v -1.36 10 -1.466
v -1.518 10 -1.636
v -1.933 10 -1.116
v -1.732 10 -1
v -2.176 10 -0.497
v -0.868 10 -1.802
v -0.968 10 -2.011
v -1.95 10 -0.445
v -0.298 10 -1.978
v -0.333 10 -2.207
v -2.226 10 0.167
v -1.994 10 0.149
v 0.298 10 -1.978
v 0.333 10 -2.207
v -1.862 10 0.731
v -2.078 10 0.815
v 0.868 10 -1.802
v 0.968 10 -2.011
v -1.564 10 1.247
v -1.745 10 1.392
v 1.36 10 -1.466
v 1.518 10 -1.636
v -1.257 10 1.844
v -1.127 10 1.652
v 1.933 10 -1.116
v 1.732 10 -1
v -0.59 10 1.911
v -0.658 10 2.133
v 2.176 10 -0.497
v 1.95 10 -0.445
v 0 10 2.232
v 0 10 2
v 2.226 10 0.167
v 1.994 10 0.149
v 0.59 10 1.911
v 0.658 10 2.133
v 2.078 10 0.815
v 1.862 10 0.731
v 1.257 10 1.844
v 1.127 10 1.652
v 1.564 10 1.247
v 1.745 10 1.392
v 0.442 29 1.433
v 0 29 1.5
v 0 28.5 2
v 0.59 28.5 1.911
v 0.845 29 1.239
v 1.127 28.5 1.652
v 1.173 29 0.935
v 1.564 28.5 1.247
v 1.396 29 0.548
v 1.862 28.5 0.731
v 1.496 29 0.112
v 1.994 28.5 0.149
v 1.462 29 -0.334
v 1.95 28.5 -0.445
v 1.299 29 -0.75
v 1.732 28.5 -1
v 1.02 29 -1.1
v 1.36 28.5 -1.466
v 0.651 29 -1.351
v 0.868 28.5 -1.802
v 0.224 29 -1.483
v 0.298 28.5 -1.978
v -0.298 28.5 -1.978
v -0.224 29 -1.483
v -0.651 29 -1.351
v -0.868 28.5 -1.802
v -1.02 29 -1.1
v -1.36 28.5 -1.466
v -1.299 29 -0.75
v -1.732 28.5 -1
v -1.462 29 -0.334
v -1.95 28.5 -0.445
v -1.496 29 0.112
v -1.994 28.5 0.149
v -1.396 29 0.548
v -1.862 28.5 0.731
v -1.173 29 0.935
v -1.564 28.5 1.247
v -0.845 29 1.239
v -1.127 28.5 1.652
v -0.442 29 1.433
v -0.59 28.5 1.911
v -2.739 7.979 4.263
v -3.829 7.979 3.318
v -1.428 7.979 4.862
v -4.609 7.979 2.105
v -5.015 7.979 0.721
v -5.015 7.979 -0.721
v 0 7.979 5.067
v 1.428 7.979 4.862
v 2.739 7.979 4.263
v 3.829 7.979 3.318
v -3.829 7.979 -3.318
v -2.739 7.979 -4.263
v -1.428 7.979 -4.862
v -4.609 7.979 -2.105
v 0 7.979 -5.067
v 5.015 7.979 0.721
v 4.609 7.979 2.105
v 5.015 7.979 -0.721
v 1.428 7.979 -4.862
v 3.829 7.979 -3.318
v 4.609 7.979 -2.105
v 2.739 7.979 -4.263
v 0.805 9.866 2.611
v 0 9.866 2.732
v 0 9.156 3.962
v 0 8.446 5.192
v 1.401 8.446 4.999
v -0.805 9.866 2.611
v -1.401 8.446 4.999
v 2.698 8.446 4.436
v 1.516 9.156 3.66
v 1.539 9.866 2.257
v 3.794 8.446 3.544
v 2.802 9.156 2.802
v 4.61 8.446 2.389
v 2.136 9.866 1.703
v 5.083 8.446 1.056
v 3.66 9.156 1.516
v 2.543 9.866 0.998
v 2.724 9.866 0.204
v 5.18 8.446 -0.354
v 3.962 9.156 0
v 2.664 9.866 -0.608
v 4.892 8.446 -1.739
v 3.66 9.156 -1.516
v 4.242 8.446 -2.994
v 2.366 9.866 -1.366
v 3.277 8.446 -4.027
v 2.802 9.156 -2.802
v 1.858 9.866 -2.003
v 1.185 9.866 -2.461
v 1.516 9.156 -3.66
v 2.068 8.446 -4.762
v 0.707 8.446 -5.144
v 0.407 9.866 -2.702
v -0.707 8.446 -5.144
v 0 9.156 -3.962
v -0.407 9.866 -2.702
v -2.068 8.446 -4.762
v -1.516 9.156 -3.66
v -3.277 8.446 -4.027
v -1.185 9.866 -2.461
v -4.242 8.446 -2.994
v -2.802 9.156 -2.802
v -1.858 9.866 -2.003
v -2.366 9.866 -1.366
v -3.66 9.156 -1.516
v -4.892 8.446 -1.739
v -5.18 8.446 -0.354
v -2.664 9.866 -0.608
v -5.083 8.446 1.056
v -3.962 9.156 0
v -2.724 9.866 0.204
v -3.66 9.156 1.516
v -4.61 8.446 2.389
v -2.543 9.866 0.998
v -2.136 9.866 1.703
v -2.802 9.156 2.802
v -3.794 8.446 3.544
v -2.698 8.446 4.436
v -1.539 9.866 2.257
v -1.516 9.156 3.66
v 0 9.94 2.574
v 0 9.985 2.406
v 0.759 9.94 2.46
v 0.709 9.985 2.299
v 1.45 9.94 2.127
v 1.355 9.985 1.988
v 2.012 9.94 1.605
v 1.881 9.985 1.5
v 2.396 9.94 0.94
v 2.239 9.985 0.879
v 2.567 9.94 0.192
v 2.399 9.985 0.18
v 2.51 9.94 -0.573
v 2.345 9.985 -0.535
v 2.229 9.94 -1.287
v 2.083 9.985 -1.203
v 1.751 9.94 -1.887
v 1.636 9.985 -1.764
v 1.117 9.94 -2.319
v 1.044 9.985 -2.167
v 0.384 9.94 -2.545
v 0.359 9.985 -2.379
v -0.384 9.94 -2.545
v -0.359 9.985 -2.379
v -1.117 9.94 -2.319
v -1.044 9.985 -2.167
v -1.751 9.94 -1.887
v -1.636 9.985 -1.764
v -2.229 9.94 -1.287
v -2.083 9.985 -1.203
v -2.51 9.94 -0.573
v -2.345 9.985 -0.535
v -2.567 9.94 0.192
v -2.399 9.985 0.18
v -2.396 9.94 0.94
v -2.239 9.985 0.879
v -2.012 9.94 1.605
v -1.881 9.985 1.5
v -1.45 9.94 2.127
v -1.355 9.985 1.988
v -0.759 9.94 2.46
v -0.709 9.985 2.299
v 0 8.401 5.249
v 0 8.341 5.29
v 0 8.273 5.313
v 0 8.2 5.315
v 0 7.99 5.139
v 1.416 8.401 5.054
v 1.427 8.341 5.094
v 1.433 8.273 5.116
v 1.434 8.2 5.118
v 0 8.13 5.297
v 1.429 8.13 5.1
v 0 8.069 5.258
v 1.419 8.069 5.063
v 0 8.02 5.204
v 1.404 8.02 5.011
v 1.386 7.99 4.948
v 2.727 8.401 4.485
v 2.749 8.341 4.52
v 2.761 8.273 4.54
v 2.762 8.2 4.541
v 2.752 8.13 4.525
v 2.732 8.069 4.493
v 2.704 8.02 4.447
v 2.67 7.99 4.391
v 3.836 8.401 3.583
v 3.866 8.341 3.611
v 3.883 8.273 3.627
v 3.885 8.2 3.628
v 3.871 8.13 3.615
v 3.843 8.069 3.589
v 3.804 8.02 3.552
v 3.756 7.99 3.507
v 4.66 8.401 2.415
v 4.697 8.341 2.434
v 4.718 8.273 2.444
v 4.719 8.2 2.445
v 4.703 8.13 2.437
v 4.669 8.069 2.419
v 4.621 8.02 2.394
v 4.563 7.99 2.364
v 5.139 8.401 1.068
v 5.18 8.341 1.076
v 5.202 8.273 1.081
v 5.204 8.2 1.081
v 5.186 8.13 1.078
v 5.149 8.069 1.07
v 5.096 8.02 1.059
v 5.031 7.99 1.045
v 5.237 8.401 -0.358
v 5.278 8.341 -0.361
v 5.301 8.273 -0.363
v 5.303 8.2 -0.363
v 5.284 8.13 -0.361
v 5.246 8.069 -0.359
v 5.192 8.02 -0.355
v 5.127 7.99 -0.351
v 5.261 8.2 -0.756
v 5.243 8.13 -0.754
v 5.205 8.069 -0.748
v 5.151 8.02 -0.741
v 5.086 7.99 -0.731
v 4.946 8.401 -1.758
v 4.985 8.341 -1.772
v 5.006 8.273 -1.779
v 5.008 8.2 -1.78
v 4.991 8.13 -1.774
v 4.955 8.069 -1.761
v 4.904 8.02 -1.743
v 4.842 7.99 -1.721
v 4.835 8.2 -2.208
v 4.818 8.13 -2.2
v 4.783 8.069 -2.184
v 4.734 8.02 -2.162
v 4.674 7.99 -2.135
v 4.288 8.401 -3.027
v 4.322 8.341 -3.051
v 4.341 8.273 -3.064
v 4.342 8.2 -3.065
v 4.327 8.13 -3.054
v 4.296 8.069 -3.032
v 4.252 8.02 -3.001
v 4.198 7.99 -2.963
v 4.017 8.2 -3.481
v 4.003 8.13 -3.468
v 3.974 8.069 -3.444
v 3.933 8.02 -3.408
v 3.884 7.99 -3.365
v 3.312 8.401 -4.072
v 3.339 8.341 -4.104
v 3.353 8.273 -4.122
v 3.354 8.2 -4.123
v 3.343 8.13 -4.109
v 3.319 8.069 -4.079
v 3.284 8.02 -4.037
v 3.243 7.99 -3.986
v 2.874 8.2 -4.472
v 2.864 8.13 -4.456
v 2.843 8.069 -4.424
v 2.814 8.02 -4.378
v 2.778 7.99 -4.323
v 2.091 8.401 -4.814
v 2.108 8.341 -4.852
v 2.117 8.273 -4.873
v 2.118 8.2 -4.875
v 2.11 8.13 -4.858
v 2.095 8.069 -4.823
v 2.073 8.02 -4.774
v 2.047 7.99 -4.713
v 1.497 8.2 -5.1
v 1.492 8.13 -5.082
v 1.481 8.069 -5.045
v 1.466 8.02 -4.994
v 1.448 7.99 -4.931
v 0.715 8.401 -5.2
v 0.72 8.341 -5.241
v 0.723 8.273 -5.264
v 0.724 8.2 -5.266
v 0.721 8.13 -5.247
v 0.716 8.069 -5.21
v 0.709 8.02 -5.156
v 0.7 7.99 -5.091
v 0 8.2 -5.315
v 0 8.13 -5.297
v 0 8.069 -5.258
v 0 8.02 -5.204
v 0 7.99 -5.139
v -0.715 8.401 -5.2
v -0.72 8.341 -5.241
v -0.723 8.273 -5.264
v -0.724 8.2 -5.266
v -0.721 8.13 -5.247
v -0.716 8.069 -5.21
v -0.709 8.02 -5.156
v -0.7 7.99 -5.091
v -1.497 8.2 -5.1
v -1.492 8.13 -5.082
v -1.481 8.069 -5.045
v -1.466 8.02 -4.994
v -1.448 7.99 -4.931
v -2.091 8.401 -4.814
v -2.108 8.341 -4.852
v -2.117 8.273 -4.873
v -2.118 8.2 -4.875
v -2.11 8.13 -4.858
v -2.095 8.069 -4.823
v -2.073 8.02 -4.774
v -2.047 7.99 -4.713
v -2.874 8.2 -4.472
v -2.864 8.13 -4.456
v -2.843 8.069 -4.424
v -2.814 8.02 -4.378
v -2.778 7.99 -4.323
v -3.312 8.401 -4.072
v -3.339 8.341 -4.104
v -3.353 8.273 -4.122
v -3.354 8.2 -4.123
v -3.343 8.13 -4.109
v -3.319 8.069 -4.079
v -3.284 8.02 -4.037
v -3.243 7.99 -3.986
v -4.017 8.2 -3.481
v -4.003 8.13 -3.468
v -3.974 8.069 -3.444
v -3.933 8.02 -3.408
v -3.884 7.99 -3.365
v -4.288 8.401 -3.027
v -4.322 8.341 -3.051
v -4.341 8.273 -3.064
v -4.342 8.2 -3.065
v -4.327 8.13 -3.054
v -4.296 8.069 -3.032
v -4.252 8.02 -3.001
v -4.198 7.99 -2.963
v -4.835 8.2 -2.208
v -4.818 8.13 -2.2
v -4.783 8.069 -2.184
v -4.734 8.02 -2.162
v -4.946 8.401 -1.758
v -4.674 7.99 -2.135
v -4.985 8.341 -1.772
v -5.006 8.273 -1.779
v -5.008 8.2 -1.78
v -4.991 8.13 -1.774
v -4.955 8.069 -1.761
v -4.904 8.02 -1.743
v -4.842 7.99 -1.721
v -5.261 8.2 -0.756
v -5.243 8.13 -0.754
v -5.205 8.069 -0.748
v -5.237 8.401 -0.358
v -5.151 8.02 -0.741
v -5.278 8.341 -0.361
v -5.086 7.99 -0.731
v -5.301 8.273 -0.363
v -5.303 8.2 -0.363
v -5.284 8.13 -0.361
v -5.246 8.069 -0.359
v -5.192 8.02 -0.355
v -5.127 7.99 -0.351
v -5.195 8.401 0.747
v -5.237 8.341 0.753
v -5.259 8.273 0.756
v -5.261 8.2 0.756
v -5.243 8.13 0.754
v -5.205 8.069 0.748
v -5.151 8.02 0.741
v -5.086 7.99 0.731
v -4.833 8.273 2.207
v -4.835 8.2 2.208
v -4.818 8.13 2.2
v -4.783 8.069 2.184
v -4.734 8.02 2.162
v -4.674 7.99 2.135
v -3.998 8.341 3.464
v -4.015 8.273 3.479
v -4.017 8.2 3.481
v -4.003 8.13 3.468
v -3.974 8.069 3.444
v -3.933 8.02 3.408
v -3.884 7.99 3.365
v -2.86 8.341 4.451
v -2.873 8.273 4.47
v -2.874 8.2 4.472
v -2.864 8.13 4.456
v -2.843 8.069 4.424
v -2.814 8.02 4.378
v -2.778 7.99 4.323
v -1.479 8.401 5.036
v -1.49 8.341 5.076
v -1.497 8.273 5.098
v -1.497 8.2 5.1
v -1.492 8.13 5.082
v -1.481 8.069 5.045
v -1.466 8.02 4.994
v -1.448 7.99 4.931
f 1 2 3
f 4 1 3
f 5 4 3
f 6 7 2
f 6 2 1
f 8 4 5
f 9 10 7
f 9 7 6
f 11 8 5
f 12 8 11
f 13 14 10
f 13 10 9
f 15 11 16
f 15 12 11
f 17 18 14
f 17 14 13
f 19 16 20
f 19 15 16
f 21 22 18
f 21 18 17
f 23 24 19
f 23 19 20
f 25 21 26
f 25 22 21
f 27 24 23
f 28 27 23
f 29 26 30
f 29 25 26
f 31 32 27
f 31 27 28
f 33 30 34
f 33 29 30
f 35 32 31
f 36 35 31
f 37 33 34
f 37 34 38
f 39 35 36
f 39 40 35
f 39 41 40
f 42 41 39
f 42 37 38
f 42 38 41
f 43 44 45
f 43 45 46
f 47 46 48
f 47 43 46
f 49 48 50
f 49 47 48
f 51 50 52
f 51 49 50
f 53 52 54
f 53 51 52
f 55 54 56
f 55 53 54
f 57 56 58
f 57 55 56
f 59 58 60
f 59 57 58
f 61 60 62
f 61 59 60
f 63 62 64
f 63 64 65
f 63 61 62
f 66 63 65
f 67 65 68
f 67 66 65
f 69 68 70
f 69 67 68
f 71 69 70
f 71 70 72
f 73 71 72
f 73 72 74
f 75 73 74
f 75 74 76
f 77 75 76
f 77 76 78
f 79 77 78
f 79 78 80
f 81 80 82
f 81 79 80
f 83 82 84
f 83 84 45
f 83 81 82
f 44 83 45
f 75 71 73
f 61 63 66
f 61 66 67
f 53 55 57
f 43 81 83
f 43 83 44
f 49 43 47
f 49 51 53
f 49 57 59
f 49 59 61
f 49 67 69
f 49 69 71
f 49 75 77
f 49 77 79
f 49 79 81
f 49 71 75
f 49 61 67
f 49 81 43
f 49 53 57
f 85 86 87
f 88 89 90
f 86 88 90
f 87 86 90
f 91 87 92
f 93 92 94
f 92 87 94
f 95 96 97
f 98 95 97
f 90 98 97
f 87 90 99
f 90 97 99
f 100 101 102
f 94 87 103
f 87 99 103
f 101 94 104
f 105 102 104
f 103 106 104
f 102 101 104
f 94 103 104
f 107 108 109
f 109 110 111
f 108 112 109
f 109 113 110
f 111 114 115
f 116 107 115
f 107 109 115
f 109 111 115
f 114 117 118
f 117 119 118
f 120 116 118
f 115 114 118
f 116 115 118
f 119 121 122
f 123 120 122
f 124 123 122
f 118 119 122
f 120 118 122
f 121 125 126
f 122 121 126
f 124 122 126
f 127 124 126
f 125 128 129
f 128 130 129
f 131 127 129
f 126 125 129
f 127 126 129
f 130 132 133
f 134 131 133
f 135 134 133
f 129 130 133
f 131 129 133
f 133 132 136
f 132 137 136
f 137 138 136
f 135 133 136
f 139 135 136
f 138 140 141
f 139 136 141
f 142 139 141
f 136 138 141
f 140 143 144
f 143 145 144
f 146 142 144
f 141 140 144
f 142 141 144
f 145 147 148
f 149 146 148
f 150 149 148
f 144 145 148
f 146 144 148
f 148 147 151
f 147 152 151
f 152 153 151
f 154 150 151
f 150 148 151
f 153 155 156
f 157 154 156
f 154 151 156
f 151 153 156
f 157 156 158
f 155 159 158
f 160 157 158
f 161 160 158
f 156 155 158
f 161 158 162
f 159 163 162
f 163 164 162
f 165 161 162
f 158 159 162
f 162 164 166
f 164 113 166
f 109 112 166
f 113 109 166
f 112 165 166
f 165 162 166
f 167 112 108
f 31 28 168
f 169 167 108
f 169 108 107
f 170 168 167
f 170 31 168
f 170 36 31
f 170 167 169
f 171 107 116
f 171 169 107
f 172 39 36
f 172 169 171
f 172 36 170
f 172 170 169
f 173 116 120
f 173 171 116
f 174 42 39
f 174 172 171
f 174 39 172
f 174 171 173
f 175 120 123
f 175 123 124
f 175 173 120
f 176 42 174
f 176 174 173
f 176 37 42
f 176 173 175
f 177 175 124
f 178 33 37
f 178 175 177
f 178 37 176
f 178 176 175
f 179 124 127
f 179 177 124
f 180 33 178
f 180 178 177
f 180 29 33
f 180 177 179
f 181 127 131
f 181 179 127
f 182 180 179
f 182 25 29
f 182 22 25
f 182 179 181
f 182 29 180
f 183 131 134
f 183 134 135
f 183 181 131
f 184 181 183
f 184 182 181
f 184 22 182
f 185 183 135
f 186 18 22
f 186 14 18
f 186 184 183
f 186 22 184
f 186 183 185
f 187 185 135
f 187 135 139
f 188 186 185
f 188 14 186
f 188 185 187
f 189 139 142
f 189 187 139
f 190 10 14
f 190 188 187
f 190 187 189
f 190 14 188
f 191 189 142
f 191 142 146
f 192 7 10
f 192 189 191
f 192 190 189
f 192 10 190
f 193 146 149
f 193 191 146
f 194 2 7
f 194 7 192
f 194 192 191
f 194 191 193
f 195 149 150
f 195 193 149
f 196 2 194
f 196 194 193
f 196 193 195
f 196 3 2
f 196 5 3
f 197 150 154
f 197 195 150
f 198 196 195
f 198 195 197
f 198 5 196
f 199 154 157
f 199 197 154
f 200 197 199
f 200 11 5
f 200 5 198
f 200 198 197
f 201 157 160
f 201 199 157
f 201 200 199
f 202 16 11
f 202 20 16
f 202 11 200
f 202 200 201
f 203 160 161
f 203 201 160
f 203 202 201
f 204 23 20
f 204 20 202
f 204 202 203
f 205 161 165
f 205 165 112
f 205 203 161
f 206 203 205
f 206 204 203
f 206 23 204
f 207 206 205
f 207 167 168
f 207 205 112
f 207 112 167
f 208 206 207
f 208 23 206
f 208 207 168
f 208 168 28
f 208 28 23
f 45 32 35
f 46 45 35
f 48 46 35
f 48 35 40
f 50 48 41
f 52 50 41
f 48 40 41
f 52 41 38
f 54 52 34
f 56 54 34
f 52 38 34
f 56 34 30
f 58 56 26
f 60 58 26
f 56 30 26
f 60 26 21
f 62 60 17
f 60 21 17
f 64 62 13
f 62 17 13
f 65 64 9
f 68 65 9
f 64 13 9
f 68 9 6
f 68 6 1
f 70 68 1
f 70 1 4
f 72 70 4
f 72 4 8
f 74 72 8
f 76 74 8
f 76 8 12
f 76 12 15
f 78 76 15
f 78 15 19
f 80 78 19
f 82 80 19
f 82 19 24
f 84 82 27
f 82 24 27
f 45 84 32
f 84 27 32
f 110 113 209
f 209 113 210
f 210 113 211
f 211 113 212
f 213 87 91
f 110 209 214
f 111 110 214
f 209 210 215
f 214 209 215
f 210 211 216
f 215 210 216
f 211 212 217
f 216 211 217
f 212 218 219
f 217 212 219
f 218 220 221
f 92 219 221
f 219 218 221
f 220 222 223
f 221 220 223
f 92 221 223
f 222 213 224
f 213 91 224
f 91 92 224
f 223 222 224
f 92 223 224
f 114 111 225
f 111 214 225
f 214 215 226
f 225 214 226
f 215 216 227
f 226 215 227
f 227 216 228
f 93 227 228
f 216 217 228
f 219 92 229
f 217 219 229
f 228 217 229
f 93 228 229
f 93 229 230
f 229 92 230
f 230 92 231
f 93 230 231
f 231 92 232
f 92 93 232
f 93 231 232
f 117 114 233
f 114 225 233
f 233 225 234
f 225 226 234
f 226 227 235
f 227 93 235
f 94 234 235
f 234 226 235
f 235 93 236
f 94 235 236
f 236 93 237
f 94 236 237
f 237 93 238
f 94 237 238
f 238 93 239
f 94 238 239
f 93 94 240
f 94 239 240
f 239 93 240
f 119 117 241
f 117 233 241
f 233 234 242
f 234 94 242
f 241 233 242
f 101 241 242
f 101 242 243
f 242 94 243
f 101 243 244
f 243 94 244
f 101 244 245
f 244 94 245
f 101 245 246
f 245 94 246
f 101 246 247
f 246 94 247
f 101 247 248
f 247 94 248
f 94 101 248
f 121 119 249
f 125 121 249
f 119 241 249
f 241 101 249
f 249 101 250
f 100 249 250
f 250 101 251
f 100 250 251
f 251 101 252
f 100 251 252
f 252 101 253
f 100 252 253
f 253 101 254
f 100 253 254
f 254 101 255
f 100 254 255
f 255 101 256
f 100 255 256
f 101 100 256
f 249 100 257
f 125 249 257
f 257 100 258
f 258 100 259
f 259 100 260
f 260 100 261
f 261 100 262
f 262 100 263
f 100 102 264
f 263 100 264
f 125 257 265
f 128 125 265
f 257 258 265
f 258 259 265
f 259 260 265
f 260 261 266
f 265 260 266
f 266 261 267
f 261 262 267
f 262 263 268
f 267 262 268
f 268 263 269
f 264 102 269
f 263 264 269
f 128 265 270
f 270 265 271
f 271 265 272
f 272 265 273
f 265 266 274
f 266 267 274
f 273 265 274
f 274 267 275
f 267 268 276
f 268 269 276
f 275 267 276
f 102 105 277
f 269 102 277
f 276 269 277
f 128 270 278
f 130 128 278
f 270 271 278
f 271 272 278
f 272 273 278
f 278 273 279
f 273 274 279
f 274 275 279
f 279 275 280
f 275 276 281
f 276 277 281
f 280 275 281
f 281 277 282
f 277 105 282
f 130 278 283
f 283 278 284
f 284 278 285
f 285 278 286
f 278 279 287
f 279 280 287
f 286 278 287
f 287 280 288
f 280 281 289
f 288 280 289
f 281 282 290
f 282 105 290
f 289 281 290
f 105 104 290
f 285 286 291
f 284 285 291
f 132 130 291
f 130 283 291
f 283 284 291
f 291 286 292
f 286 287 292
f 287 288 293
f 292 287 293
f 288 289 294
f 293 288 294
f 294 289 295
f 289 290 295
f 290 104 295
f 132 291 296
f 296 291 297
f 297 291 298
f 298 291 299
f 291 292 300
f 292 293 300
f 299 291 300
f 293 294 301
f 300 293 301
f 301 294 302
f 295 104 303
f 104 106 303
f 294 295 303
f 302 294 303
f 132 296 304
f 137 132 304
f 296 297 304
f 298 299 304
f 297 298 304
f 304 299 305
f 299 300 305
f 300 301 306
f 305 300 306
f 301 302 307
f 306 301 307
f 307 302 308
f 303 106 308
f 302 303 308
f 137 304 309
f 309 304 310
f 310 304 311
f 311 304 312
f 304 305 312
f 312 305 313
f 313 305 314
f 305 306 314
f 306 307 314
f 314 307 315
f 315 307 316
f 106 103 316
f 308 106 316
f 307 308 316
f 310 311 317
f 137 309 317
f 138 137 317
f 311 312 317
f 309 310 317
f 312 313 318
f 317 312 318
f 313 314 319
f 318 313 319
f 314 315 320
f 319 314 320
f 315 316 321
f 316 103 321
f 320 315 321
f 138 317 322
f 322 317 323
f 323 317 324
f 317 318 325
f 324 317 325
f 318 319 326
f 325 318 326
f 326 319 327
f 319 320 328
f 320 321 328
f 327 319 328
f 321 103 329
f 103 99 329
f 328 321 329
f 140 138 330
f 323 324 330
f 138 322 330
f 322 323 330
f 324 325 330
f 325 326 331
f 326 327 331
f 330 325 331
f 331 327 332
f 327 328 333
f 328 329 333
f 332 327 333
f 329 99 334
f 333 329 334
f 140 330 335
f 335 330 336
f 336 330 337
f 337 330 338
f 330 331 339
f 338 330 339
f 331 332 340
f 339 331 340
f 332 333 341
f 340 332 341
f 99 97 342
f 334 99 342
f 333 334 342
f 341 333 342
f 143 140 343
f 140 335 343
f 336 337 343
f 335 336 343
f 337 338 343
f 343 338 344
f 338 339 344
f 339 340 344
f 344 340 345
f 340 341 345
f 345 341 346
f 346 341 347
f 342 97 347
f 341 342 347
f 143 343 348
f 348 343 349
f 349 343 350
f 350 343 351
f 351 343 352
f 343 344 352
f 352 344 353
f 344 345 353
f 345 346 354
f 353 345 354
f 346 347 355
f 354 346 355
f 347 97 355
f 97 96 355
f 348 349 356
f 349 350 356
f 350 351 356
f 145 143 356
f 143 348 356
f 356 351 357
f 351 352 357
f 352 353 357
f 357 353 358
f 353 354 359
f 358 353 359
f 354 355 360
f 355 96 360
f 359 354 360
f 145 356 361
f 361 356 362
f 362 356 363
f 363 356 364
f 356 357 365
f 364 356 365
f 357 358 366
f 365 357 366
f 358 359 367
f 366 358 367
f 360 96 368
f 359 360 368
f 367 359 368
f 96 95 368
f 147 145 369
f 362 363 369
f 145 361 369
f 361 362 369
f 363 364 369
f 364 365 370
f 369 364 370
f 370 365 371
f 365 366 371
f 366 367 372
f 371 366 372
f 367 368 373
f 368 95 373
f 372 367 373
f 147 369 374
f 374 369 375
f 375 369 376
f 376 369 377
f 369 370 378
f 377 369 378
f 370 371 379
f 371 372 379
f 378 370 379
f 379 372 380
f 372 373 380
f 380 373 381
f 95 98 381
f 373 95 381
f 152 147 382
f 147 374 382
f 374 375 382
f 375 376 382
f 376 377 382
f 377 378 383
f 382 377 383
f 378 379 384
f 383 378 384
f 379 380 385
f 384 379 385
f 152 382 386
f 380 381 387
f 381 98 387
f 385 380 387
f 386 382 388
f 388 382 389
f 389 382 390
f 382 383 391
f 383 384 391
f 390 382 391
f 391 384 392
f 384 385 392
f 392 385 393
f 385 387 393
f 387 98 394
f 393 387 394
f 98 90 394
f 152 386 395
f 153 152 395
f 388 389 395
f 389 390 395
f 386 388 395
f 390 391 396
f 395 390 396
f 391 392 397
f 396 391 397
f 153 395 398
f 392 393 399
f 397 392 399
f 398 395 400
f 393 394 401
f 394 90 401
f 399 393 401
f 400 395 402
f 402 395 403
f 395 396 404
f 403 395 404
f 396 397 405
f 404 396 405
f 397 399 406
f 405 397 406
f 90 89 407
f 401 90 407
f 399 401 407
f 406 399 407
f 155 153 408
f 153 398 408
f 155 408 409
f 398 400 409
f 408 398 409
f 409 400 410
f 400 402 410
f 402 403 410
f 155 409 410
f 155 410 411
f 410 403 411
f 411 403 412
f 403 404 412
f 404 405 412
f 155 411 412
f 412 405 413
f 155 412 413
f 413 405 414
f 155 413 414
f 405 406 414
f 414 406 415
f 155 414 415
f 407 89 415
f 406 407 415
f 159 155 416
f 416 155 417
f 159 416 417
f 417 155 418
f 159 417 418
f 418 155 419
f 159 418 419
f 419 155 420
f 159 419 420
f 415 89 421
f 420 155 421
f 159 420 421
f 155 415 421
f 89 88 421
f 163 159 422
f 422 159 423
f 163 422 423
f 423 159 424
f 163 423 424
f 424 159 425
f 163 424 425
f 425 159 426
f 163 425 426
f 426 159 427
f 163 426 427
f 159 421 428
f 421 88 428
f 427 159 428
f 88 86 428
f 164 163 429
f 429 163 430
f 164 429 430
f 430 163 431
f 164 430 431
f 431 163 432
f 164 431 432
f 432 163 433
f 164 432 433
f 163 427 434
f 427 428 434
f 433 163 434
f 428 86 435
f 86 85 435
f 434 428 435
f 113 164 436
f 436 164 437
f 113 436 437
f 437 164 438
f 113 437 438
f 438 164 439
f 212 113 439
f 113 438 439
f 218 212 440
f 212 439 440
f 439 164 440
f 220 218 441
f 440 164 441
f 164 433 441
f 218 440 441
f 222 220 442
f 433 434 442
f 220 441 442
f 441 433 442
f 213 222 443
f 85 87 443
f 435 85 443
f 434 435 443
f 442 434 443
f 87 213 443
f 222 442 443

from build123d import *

# Parameters (mm, degrees)
SKETCH1_R               = 6
BOSS_EXTRUDE1_DEPTH     = 10
CHAMFER1_SIZE           = 3.5
CHAMFER1_SIZE2          = 2.020725942
CUT_EXTRUDE1_DEPTH      = 14.114877049
CUT_EXTRUDE1_DEPTH_BACK = 14.114877049
SKETCH2_W               = 12
SKETCH2_H               = 7.979274058
SKETCH3_R               = 2
BOSS_EXTRUDE2_DEPTH     = 19
CHAMFER2_SIZE           = 0.5
FILLET1_R               = 0.25
FILLET2_R               = 1


with BuildPart() as part:
    # Sketch1 → Boss-Extrude1 (new body)
    with BuildSketch(Plane(origin=(0, 0, 0), x_dir=(1, 0, 0), z_dir=(0, 1, 0))):
        with Locations(Location((0, 0, 0), (0, 0, 270))):
            Circle(SKETCH1_R)
    extrude(amount=BOSS_EXTRUDE1_DEPTH)

    # Chamfer1
    chamfer1_edges = [part.edges().sort_by_distance(p)[0] for p in [
        (0, 10, -6),
    ]]
    chamfer1_side = [part.faces().sort_by_distance(p)[0] for p in [
        (0, 10, 0),
    ]]
    chamfer(chamfer1_edges, length=CHAMFER1_SIZE, length2=CHAMFER1_SIZE2, reference=chamfer1_side[0])

    # Sketch2 → Cut-Extrude1 (cut, two sides: drawn at the far end of the back side and taken through both)
    with BuildSketch(Plane.XY.offset(-CUT_EXTRUDE1_DEPTH_BACK)):
        with Locations((0, 3.989637029)):
            Rectangle(SKETCH2_W, SKETCH2_H)
    extrude(amount=CUT_EXTRUDE1_DEPTH + CUT_EXTRUDE1_DEPTH_BACK, mode=Mode.SUBTRACT)

    # Sketch3 → Boss-Extrude2 (add)
    with BuildSketch(Plane(origin=(0, 10, 0), x_dir=(1, 0, 0), z_dir=(0, 1, 0))):
        with Locations(Location((0, 0, 0), (0, 0, 270))):
            Circle(SKETCH3_R)
    extrude(amount=BOSS_EXTRUDE2_DEPTH)

    # Chamfer2
    chamfer2_edges = [part.edges().sort_by_distance(p)[0] for p in [
        (0, 29, -2),
    ]]
    chamfer(chamfer2_edges, length=CHAMFER2_SIZE)

    # Fillet1
    fillet1_edges = [part.edges().sort_by_distance(p)[0] for p in [
        (0, 7.979274058, -6),
    ]]
    fillet(fillet1_edges, radius=FILLET1_R)

    # Fillet2
    fillet2_edges = [part.edges().sort_by_distance(p)[0] for p in [
        (0, 10, -2.5),
    ]]
    fillet(fillet2_edges, radius=FILLET2_R)


solid = part.part
